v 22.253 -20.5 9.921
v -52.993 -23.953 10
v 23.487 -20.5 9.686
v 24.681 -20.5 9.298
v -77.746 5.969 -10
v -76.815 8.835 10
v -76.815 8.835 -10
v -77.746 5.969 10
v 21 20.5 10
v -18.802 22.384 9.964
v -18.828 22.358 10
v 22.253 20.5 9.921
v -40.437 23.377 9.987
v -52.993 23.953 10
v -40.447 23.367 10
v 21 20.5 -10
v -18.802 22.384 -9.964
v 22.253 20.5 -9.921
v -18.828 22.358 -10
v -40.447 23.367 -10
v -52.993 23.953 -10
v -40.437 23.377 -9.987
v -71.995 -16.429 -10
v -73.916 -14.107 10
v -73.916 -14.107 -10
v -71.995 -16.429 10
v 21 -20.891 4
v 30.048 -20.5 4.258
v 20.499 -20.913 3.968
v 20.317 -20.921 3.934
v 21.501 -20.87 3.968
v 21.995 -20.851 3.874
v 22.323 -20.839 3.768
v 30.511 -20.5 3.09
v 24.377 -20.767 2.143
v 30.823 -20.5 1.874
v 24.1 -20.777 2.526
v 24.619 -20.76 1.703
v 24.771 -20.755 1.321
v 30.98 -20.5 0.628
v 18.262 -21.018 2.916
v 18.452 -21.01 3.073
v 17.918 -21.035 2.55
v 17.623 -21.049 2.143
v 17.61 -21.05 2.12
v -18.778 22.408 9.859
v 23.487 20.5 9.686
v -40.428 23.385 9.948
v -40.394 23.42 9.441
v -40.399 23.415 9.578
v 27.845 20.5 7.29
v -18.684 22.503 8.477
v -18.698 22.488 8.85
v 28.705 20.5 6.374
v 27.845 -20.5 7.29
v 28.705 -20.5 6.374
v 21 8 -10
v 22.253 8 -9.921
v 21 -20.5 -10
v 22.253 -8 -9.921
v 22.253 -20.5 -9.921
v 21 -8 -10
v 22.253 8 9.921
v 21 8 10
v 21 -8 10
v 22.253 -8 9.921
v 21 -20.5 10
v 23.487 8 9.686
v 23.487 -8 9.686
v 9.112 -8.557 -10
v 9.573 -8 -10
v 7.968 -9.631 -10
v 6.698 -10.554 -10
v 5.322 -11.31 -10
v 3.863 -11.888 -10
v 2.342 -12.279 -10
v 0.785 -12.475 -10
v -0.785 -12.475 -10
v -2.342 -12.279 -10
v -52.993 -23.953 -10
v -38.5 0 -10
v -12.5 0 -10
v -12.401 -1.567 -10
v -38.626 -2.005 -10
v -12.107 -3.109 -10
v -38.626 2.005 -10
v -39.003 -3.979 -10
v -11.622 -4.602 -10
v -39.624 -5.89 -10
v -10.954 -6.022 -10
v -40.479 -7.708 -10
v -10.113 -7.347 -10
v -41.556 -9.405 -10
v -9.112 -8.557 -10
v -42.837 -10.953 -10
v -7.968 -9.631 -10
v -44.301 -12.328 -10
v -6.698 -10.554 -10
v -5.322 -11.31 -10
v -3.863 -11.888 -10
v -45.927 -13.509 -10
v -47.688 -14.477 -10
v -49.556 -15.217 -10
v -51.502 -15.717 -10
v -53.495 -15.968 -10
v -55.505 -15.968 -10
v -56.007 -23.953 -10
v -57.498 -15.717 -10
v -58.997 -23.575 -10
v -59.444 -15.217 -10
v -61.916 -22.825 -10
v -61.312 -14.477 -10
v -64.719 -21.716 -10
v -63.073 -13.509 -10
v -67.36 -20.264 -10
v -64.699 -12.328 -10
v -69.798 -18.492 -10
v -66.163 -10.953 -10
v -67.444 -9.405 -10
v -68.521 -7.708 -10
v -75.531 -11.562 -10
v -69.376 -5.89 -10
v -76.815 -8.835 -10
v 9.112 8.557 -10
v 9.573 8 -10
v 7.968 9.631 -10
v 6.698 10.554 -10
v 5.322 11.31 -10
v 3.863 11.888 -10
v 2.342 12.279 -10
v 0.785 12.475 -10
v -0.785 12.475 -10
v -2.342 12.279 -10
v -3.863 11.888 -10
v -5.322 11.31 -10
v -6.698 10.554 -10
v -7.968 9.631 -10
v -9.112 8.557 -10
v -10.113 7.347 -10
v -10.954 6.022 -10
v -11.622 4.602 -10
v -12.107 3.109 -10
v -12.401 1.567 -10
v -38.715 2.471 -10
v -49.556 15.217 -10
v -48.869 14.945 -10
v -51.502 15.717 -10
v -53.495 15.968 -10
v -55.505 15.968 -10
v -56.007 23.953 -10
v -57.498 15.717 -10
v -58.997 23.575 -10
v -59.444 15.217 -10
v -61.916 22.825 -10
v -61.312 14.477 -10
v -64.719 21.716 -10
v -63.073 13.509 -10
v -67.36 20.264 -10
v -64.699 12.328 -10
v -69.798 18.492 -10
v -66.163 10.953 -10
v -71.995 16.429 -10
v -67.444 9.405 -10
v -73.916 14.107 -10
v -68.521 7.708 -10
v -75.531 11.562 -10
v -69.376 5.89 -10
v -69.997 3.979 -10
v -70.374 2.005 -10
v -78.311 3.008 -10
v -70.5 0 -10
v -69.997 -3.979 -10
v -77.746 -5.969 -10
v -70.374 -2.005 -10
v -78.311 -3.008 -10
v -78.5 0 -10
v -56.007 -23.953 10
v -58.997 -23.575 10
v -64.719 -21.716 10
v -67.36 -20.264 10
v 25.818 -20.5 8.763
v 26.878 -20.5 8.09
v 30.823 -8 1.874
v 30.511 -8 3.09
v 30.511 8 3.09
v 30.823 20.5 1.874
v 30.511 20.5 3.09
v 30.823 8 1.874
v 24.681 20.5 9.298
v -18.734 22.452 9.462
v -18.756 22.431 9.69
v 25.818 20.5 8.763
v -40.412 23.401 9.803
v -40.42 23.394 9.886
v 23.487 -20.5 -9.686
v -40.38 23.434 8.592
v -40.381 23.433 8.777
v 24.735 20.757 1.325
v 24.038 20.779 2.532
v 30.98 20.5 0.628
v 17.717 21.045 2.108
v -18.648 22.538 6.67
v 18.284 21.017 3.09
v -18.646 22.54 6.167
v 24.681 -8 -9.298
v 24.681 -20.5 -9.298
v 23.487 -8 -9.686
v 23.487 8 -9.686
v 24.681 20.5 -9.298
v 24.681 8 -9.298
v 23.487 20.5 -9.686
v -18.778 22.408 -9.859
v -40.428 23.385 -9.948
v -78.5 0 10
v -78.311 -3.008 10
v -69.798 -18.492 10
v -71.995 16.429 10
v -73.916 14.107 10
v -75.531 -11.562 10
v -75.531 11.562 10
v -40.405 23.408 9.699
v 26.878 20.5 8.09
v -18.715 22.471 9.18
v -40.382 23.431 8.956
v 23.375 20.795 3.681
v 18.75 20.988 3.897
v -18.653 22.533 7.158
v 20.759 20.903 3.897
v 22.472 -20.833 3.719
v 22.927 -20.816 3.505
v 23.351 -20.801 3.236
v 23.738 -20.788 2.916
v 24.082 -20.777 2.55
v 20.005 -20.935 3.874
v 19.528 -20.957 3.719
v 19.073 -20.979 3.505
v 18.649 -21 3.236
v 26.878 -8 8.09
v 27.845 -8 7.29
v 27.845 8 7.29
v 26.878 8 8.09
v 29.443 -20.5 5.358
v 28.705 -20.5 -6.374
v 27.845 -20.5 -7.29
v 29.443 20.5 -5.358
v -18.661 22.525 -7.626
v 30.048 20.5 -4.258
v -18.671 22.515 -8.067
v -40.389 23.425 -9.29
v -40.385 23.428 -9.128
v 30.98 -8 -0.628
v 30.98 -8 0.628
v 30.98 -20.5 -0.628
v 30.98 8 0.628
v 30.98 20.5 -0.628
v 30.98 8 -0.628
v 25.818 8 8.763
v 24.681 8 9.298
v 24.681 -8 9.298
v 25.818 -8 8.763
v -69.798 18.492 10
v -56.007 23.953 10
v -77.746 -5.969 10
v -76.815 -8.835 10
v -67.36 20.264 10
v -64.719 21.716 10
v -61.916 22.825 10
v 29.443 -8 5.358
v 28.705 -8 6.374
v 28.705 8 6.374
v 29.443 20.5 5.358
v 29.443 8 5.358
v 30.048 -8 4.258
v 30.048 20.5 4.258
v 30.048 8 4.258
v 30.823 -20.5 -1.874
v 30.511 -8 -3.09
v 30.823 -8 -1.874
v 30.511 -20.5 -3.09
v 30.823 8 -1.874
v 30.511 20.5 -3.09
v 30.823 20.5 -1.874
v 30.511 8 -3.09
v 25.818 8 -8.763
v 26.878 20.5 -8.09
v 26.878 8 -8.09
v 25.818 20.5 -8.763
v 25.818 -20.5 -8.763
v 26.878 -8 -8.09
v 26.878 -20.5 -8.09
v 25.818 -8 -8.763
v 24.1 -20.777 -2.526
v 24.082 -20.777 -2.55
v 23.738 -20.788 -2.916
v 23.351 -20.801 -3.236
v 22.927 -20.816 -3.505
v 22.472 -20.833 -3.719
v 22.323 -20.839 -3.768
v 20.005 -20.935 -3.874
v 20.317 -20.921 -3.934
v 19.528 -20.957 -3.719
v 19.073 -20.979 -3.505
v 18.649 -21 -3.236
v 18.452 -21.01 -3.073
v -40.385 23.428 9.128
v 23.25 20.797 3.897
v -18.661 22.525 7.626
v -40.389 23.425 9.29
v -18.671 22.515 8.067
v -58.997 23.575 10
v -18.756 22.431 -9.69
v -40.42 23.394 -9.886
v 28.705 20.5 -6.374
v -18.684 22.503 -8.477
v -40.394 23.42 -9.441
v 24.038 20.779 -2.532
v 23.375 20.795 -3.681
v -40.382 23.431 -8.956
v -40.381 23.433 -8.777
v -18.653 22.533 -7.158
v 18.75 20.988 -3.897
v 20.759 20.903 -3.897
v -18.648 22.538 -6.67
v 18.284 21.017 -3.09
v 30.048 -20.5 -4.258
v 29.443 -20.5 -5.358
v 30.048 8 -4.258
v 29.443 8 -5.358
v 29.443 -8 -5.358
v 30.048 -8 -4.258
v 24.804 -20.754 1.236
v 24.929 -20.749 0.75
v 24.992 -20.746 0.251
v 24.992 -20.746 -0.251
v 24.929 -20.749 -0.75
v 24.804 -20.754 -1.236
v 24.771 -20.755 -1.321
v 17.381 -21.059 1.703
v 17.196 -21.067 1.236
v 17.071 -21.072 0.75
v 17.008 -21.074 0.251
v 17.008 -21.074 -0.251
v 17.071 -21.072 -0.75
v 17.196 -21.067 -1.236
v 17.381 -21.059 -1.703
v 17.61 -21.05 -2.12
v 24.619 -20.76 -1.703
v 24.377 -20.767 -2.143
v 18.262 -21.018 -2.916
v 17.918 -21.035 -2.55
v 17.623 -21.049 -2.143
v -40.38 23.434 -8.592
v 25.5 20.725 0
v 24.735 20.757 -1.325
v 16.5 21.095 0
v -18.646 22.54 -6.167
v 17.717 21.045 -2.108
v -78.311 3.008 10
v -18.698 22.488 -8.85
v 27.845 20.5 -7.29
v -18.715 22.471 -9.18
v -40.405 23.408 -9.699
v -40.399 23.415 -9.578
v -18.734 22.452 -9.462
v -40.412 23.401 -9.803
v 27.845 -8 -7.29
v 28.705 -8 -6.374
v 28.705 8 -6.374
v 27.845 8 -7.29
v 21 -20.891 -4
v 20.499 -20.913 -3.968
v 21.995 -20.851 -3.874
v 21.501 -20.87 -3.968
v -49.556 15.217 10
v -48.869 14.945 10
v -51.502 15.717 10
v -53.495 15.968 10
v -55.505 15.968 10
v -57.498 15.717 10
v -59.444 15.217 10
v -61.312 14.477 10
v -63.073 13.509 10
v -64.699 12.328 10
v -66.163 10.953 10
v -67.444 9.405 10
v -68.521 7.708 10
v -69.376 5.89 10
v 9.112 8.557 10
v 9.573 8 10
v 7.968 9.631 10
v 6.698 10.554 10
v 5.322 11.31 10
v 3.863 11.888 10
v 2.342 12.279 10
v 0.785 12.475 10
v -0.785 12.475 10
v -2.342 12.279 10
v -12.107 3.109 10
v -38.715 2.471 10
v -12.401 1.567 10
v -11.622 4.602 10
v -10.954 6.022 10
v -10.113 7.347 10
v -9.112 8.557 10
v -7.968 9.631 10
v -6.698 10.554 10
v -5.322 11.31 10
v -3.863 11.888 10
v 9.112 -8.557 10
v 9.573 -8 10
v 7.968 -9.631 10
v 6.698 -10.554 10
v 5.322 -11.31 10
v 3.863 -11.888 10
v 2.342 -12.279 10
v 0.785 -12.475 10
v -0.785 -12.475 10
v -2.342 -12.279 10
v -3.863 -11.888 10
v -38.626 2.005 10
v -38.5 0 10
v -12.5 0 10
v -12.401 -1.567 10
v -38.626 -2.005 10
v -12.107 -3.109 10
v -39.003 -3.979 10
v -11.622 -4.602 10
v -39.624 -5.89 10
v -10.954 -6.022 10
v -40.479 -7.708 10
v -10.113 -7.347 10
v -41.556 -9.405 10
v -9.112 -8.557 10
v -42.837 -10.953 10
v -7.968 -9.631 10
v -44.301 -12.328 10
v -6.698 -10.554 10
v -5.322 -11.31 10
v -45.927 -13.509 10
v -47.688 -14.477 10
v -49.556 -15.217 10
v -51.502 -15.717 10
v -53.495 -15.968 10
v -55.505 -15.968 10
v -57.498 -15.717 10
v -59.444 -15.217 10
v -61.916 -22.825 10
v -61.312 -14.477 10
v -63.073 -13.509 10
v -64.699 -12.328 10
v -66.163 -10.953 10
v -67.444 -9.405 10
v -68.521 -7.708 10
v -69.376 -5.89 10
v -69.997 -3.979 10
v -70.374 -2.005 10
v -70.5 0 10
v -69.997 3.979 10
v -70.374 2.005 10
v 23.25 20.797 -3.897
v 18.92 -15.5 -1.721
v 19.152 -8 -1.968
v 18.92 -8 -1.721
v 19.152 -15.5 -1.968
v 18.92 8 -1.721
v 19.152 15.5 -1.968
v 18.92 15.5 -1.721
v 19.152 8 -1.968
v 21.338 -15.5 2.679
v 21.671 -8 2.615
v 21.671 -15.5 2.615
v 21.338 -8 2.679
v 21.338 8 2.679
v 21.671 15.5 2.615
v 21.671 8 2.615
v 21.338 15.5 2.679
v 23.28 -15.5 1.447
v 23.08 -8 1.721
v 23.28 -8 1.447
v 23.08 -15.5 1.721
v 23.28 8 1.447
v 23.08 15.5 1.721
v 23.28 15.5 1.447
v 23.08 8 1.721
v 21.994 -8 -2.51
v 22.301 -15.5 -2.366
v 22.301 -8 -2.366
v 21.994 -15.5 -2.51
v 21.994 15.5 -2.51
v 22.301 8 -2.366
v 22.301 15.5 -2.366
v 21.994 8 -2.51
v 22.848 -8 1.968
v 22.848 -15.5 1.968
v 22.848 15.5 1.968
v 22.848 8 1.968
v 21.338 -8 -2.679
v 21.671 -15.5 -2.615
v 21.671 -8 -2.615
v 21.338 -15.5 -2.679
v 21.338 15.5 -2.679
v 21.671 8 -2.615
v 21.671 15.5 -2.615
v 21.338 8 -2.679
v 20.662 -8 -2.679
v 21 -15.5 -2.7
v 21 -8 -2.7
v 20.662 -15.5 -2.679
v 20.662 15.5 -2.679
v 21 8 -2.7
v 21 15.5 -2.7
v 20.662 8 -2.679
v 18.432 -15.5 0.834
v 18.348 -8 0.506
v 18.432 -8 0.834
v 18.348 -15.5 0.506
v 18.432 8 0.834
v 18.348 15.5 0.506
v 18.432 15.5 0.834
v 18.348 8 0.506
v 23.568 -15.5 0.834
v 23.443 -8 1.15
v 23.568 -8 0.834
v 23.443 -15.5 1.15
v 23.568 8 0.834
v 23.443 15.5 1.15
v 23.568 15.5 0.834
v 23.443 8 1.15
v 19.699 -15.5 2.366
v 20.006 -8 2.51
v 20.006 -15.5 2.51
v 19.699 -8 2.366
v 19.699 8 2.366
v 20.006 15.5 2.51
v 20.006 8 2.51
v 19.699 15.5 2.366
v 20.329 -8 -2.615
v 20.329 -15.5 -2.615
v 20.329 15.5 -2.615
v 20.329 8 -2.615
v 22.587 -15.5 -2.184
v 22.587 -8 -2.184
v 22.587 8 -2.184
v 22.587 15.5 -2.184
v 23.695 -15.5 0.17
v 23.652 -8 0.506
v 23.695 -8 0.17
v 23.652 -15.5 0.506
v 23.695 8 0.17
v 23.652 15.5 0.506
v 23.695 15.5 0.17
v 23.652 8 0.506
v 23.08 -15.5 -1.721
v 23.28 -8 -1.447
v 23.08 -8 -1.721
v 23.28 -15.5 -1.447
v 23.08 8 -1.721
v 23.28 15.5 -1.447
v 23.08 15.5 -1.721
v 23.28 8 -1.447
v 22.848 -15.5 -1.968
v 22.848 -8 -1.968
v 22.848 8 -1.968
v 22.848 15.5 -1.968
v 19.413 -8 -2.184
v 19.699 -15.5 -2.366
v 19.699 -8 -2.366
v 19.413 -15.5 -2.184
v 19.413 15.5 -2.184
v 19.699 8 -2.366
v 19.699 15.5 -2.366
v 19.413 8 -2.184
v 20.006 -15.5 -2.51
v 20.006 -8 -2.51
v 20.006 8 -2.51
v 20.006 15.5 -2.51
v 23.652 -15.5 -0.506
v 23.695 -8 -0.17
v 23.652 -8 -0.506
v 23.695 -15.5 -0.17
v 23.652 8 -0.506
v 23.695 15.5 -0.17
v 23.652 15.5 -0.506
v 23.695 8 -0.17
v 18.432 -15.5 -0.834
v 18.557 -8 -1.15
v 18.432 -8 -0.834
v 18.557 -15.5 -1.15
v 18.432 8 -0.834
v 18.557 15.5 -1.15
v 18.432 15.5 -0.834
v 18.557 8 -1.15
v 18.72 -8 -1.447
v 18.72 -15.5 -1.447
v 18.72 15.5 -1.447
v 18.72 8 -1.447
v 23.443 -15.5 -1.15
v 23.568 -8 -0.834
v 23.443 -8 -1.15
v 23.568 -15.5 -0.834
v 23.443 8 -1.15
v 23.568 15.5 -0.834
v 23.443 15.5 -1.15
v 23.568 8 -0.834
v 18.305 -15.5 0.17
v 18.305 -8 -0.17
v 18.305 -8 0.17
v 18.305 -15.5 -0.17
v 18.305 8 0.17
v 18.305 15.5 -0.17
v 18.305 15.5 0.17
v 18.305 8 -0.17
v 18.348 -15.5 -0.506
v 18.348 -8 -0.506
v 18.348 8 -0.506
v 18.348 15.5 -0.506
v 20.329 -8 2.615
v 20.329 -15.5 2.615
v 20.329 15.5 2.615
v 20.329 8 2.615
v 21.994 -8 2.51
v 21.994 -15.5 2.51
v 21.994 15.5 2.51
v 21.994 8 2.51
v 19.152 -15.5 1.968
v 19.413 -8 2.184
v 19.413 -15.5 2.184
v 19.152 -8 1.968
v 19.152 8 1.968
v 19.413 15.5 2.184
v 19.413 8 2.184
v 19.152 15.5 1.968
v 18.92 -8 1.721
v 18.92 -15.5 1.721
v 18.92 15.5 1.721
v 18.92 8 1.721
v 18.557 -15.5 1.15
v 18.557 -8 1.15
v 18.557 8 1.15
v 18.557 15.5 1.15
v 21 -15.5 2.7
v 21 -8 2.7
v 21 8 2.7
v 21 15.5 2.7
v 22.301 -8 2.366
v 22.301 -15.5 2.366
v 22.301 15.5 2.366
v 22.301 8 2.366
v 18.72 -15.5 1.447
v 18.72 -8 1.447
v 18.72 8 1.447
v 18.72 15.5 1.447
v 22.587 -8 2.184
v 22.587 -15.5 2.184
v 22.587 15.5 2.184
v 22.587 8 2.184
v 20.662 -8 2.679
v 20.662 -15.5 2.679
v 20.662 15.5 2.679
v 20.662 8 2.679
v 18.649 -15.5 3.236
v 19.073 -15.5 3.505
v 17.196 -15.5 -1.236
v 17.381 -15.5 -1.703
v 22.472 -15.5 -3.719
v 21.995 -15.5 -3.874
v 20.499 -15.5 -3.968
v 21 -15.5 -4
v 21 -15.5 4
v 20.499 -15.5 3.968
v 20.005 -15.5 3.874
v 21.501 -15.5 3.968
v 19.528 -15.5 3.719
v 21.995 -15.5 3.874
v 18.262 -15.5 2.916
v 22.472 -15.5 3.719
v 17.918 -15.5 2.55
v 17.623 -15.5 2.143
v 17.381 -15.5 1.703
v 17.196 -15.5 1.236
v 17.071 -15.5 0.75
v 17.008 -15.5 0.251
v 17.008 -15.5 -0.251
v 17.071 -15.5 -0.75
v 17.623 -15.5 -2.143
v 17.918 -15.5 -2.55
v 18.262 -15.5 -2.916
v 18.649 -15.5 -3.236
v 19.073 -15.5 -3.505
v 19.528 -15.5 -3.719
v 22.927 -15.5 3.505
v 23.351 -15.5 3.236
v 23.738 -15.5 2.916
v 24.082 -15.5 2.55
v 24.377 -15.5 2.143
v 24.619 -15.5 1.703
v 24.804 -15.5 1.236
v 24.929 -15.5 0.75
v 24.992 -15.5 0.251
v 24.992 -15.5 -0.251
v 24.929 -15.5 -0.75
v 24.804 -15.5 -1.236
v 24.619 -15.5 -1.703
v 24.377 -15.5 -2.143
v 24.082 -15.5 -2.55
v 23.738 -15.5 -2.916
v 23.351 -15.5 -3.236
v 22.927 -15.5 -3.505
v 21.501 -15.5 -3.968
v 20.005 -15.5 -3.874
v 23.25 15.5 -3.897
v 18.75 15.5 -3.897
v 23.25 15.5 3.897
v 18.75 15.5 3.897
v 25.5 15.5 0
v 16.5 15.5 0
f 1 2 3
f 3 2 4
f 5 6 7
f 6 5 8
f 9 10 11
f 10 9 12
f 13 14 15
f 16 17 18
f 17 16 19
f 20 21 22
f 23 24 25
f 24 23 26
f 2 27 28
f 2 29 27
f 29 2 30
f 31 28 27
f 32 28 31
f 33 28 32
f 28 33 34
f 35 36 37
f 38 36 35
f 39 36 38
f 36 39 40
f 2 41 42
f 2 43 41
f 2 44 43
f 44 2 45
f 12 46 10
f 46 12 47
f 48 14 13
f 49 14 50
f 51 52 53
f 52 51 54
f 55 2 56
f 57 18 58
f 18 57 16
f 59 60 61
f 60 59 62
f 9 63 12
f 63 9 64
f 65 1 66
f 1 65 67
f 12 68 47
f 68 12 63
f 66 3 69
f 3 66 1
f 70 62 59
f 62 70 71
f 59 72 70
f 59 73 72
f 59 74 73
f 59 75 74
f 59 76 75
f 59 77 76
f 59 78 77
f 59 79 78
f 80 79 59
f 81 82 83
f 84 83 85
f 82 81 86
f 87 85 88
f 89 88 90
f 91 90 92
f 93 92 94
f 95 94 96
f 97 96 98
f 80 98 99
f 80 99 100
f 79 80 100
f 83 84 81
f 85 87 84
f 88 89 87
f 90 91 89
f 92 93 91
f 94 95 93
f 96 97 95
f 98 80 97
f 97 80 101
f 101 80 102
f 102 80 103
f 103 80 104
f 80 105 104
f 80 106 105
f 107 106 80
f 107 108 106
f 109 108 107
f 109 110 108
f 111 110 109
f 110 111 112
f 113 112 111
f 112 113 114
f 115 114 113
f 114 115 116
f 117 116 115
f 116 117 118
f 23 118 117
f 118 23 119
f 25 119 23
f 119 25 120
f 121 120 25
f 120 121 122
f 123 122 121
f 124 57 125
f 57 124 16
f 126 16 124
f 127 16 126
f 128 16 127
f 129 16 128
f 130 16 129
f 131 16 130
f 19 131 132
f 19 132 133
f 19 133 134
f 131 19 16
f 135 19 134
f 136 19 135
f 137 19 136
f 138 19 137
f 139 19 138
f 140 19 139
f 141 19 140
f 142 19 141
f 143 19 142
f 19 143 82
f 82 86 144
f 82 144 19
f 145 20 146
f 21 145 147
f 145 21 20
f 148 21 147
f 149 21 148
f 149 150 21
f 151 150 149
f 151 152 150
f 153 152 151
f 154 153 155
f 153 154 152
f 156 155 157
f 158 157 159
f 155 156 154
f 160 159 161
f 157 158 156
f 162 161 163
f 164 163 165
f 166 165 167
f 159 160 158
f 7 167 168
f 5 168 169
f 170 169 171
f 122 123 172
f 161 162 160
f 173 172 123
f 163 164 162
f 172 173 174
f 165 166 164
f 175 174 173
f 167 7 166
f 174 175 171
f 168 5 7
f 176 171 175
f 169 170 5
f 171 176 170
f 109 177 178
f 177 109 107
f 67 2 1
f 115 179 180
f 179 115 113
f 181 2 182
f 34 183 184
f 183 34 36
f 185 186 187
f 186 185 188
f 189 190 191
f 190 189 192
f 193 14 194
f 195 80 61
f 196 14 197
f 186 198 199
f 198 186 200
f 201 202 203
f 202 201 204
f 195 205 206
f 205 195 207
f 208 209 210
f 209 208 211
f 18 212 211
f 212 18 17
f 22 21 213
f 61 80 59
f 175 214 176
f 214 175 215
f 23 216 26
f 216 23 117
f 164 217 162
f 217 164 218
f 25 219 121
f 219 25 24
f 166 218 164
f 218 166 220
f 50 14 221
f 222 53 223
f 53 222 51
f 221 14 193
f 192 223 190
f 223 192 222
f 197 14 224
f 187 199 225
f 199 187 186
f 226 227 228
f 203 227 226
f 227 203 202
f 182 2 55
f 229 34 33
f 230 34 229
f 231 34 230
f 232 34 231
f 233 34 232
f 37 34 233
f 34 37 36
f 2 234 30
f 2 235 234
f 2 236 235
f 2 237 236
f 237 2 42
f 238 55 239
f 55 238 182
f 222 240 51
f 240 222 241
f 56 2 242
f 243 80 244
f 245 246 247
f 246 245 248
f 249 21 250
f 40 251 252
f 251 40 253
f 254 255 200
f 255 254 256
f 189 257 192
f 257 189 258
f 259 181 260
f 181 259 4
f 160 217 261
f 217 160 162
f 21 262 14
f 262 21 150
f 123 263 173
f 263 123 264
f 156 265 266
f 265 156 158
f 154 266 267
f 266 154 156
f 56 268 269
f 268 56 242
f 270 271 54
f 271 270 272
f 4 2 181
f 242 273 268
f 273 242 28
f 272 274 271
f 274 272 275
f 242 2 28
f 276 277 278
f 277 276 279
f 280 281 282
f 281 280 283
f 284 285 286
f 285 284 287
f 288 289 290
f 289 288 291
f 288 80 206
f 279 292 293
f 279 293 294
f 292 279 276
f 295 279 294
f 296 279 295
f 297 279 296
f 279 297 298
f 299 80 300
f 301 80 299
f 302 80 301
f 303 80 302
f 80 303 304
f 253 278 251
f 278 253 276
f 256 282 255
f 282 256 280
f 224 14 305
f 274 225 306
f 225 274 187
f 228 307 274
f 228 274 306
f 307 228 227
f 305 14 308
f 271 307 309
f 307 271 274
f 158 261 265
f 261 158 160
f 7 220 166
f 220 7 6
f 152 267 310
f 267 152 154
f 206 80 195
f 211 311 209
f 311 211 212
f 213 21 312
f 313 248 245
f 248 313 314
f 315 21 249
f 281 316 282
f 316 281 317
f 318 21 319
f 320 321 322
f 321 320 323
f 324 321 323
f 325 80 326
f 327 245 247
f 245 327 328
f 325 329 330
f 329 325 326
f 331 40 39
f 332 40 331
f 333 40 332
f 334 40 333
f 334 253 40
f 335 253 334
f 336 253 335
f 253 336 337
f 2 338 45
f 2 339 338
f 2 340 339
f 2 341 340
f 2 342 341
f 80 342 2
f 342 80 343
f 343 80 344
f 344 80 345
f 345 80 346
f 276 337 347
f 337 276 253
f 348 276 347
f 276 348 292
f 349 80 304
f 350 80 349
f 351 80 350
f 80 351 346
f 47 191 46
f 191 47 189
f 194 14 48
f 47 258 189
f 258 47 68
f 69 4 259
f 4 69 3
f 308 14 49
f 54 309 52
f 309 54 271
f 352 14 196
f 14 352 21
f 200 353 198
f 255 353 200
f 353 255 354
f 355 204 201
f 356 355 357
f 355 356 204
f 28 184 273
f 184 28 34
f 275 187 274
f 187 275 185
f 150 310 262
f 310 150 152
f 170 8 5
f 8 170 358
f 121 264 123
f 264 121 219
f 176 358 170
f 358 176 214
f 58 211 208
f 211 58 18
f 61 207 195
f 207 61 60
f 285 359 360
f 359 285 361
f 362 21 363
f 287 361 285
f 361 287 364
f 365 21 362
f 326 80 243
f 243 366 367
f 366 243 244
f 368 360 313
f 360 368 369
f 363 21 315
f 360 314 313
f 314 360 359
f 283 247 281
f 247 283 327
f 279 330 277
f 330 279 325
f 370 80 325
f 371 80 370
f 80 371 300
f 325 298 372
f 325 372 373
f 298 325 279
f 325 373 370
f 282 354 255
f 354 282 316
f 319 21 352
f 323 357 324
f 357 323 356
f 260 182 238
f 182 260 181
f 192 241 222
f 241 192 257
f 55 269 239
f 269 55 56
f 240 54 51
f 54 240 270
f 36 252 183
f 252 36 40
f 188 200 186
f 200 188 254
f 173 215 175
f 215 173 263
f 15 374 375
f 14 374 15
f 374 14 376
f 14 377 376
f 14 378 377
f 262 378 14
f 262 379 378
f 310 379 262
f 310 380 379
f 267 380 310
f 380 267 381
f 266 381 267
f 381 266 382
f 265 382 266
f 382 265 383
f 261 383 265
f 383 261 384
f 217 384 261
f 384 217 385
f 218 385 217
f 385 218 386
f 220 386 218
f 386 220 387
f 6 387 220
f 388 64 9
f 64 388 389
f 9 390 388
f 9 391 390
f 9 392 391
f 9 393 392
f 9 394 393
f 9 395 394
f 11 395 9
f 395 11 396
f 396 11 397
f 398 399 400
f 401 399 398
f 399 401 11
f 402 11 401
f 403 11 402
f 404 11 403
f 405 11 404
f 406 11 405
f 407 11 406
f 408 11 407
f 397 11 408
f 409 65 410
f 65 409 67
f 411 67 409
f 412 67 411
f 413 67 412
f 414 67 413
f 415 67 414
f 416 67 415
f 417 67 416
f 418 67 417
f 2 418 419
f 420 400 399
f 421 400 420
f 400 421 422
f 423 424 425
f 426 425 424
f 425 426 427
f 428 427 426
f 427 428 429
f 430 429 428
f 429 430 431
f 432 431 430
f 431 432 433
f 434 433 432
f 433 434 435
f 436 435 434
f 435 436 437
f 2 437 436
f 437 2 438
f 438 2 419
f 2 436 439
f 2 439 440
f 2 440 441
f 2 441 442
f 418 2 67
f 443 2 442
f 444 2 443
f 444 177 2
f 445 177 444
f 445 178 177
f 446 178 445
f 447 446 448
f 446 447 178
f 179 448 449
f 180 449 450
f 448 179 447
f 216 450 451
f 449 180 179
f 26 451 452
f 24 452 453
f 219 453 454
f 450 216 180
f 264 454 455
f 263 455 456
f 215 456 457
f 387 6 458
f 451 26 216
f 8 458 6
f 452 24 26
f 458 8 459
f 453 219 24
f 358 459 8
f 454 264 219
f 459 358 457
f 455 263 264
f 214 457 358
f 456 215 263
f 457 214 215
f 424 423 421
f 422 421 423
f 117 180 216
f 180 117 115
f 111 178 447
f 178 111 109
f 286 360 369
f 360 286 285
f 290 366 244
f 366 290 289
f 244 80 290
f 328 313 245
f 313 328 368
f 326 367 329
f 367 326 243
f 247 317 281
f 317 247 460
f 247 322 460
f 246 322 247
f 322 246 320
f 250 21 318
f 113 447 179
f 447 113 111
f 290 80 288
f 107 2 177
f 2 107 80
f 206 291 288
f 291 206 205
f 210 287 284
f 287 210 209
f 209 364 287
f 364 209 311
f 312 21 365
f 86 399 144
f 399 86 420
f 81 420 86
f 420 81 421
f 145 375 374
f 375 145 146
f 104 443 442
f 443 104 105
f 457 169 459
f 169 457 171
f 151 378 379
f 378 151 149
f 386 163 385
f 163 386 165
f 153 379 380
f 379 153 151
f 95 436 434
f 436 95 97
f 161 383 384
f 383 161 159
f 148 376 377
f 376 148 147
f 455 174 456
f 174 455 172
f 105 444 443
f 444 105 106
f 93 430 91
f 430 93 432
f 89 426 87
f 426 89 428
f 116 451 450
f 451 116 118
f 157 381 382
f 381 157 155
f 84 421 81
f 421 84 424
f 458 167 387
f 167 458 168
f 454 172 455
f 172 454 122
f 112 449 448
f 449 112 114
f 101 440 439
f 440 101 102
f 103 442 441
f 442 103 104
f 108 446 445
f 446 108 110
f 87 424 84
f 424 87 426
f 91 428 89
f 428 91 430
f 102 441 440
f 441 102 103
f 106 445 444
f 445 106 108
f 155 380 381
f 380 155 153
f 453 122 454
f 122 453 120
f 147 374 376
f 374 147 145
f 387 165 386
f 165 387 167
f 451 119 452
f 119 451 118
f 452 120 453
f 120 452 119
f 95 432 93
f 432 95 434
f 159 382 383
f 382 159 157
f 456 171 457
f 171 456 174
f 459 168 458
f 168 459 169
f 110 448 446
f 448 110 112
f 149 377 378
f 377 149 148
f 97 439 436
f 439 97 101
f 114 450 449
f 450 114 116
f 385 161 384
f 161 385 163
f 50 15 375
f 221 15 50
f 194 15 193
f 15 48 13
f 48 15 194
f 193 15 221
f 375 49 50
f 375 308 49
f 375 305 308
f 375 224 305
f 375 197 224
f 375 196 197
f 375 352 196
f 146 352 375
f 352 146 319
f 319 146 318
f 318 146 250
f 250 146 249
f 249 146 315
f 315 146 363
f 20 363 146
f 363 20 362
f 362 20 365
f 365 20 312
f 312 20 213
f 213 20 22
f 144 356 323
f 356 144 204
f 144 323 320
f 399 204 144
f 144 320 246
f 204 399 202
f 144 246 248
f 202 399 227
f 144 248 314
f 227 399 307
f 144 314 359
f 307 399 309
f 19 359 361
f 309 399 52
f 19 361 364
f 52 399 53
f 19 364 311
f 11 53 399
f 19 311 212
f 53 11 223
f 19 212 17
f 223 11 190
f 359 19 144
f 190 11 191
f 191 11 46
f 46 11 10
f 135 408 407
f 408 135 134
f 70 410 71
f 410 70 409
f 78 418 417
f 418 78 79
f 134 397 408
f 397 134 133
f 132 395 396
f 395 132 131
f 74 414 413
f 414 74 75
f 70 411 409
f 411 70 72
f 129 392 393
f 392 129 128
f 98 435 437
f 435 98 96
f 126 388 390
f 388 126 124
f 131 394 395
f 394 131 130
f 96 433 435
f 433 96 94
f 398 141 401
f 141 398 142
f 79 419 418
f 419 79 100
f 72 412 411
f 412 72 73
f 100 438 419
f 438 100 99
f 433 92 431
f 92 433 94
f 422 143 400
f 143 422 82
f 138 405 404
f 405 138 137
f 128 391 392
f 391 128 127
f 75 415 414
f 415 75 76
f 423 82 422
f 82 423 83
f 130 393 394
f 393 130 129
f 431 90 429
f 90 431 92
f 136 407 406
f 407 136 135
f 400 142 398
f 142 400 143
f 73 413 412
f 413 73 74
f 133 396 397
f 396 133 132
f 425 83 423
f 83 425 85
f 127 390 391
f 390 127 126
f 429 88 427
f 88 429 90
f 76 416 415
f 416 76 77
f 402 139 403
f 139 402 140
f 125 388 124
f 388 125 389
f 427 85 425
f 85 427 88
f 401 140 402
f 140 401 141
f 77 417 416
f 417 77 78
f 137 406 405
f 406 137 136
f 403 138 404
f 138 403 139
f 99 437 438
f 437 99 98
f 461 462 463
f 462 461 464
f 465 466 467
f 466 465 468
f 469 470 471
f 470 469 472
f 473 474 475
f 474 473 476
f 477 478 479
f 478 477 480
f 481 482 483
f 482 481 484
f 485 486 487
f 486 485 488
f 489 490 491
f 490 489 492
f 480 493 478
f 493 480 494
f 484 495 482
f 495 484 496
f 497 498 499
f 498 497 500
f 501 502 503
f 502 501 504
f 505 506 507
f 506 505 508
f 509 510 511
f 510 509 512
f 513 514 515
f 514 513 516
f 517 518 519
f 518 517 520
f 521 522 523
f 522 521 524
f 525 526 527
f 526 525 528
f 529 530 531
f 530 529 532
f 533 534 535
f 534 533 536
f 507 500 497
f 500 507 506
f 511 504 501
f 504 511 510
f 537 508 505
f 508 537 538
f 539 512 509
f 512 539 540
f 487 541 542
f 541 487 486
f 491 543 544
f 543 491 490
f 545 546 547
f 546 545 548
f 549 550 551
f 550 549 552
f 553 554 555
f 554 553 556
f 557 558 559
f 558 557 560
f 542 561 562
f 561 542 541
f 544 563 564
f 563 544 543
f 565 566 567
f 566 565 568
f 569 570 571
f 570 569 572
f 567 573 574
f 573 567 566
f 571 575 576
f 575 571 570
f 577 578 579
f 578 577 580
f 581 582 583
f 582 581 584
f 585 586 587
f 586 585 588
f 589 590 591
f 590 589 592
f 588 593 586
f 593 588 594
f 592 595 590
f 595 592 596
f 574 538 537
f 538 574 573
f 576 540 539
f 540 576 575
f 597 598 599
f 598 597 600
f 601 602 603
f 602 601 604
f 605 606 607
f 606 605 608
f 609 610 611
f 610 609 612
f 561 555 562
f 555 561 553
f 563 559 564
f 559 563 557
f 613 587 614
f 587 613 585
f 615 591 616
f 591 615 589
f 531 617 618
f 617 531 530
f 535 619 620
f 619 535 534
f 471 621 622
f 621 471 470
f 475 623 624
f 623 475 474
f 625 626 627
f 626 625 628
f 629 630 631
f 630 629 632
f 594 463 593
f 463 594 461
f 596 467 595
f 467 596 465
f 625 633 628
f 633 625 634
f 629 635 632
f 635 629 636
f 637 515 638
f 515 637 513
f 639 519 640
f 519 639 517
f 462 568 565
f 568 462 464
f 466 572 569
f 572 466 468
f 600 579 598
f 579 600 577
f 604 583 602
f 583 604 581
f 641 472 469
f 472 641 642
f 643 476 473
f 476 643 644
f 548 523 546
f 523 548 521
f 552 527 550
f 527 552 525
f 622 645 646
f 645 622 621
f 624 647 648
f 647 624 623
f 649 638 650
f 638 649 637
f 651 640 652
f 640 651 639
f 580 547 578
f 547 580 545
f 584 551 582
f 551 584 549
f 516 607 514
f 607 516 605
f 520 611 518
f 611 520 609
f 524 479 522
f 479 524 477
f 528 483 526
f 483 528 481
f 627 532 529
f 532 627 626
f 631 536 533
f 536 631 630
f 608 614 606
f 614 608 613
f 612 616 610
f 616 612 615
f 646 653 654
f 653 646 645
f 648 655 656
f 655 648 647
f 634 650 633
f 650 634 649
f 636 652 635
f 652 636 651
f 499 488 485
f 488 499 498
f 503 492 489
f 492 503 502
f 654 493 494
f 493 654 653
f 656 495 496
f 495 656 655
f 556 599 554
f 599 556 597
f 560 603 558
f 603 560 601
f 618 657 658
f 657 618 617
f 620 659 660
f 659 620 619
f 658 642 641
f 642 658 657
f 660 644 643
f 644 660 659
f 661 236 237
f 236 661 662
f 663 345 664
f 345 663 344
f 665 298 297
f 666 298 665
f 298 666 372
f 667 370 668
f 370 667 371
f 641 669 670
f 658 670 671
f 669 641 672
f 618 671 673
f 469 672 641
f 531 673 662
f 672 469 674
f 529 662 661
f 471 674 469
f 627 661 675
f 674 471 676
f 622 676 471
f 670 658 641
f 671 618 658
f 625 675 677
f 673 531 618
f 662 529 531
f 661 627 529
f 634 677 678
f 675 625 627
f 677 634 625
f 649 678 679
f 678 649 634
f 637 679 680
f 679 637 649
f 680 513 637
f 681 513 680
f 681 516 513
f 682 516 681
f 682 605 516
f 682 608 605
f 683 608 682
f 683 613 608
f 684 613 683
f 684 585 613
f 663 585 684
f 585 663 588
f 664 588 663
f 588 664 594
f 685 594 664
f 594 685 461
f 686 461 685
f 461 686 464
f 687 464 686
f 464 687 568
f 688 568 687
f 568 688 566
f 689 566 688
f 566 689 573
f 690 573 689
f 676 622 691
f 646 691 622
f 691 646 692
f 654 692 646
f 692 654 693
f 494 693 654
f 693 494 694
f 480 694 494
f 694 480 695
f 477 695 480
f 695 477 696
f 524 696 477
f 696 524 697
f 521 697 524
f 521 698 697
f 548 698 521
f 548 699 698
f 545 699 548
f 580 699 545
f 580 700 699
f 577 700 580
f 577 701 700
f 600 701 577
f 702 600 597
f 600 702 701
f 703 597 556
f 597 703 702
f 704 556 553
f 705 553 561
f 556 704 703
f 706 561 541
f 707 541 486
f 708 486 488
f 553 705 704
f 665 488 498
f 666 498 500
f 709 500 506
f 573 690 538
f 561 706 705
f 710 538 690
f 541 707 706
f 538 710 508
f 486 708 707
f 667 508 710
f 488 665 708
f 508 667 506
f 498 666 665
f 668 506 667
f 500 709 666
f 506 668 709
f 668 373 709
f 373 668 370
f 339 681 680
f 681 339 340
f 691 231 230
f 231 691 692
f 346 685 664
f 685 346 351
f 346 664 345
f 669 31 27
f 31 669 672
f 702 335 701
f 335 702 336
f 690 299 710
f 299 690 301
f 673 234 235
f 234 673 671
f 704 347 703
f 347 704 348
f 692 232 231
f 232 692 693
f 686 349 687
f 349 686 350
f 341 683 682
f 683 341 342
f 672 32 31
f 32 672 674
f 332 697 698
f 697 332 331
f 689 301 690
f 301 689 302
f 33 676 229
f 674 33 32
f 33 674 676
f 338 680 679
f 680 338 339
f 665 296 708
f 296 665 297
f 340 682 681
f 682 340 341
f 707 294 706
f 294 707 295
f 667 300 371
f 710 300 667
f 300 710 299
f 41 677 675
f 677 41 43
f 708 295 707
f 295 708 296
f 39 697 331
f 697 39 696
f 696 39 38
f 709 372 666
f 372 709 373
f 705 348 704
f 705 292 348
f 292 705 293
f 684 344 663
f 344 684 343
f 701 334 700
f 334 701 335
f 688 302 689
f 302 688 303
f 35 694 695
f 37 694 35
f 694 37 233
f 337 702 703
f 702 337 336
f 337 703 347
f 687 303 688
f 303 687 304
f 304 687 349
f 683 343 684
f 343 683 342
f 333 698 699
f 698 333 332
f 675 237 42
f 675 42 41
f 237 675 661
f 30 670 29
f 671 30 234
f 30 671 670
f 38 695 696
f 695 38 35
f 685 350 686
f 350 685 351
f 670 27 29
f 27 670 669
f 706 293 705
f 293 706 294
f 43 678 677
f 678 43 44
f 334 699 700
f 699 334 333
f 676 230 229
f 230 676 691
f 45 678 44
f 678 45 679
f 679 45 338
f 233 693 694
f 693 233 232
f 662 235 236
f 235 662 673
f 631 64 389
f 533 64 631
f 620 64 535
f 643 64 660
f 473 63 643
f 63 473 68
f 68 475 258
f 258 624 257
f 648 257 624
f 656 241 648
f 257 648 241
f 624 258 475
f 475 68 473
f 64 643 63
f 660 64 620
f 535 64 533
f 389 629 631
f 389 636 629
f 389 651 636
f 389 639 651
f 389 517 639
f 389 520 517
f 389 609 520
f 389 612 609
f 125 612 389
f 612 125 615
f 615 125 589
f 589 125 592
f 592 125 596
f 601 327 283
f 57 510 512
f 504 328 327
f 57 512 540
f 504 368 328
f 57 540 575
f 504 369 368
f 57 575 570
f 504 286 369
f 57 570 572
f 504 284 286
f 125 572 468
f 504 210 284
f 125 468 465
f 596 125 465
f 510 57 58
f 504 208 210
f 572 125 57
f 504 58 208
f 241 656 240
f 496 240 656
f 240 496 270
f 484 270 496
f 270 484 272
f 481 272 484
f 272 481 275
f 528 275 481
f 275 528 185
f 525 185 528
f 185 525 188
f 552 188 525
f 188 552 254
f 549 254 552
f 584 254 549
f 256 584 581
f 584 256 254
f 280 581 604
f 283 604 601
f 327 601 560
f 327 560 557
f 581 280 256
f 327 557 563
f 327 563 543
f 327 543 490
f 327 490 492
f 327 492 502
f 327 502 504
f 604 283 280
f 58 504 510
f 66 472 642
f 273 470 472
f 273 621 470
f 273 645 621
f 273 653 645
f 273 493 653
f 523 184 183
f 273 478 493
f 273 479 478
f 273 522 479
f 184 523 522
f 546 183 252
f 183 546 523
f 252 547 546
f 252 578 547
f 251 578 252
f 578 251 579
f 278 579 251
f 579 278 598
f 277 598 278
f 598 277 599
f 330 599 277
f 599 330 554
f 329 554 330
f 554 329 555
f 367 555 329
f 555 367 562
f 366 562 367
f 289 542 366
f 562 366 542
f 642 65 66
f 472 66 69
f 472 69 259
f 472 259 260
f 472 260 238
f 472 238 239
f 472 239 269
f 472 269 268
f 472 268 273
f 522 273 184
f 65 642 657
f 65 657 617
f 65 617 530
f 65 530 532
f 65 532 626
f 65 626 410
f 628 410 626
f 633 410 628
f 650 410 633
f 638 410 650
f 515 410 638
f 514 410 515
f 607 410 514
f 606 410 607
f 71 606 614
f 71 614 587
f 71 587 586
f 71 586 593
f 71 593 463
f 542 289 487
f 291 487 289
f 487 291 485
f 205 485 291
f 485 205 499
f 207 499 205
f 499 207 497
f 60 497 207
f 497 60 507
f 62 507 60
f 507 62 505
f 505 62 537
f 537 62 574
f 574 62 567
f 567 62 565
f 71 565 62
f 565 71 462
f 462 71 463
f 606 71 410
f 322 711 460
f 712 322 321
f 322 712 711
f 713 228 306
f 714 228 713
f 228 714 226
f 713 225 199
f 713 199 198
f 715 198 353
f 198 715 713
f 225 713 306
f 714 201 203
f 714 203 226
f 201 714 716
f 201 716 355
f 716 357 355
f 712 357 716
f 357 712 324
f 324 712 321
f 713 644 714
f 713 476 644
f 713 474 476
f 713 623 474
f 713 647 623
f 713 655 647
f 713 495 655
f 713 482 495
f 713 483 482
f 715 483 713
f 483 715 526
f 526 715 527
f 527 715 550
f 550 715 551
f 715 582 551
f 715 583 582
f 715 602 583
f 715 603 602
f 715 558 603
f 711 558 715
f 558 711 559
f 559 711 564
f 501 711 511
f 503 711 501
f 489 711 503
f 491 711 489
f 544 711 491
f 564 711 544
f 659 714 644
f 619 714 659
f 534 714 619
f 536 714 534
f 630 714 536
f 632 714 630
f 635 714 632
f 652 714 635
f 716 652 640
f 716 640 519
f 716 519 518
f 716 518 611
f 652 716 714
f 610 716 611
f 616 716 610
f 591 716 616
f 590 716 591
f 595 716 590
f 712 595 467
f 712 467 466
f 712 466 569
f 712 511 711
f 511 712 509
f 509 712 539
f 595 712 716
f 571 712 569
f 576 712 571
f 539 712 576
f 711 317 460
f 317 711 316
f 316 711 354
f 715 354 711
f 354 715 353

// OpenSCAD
//////////////////////////  Soporte para Carrito / Maleta  //////////////////////////


////////////// Creado por Luis Rodríguez para la Fundación ONCE - 2019 /////////////



//Este software se distribuye bajo licencia Creative Commons - Attribution - NonCommercial - ShareAlike license.
//https://creativecommons.org/licenses/by-nc-sa/4.0/
//Este software no tiene ningún tipo de garantía y el usuario será el único responsable de su uso



//////////Este Soporte está pensado para poder arrastrar detrás de la silla de ruedas un carrito o una maleta de forma autónoma. Para ello, el usurio tiene que poder anclar el carrito o la maleta de forma autónoma, por lo que en principio debe ser un usuario de silla de ruedas activo//////////


///////////////Todos los parámetros están medidos en milímetros///////////////


/////////////////////////////////////////////////////////////////////////////////////

/*[Parámetros]*/


//Diámetro del tubo de la silla de ruedas a donde se va a fijar el soporte
Diametro = 25;      //[20:1:35]

//Anchura del soporte
Ancho = 20;         //[15:1:30]

//Grosor de las paredes del soporte
Grosor = 8;         //[6:0.5:10]

//Diámetro del tornillo que se va a utilizar
Tornillo = 5;       //[4:1:6]

//Diámetro de la cabeza del tornillo
Cabeza = 8;         //[6:1:12]

//Diámetro de la tuerca hexagonal que se va a utilizar (en su parte más ancha)
Tuerca = 9;         //[5:1:12]

//Diámetro del asa del carro o maleta a transportar
Dia_Carro = 32;     //[15:1:45]

//Separación entre la mordaza y el enganche del carro
Separacion = 10;    //[0:5:25]




/*[Hidden]*/

Tubo = Diametro/2;
Carro = Dia_Carro/2;



///////////////////////////////////Módulos///////////////////////////////////


module Mordaza() {
hull() {
    cylinder(Ancho,Tubo+Grosor,Tubo+Grosor,$fn=50,center=true);
        translate([Diametro-Grosor/2,0,0])
        rotate([0,90,90])
            cylinder(Diametro+Grosor*2,Ancho/2,Ancho/2,$fn=50,center=true);
        }
                 }


module Carrito() {
translate([-Tubo-Dia_Carro/2-Grosor*2-Separacion,0,0])
    cylinder(Ancho,Carro+Grosor,Carro+Grosor,$fn=50,center=true);
                  }


module Base() {
hull() {
    Mordaza();
    Carrito();
        }
               }


difference() {
Base();
    
    translate([-Tubo-Dia_Carro/2-Grosor*2-Separacion,0,0])
        cylinder(Ancho+1,Carro,Carro,$fn=50,center=true);


    translate([-Tubo-Dia_Carro/2-Separacion/2-3,Carro,0])
    rotate([0,0,45])
        cube([Carro*3,Carro,Ancho+1],center=true);


    cylinder(Ancho+1,Tubo,Tubo,$fn=50,center=true);

    translate([Diametro-Grosor/2,0,0])
    rotate([0,90,90])
        cylinder(Diametro+Grosor*4+1,Tornillo/2+0.2,Tornillo/2+0.2,$fn=50,center=true);

    rotate([90,90,0])
    translate([0,Diametro-Grosor/2,+Tubo+Grosor])
        cylinder(10,Cabeza/2,Cabeza/2,$fn=50,center=true);

    translate([Diametro,0,0])
        cube([Diametro+Grosor*2,Grosor*2,Ancho+1],center=true);

    rotate([90,0,0])
    translate([Diametro-Grosor/2,0,-Tubo-Grosor])
        cylinder(10,Tuerca/2,Tuerca/2,$fn=6,center=true);

             }
